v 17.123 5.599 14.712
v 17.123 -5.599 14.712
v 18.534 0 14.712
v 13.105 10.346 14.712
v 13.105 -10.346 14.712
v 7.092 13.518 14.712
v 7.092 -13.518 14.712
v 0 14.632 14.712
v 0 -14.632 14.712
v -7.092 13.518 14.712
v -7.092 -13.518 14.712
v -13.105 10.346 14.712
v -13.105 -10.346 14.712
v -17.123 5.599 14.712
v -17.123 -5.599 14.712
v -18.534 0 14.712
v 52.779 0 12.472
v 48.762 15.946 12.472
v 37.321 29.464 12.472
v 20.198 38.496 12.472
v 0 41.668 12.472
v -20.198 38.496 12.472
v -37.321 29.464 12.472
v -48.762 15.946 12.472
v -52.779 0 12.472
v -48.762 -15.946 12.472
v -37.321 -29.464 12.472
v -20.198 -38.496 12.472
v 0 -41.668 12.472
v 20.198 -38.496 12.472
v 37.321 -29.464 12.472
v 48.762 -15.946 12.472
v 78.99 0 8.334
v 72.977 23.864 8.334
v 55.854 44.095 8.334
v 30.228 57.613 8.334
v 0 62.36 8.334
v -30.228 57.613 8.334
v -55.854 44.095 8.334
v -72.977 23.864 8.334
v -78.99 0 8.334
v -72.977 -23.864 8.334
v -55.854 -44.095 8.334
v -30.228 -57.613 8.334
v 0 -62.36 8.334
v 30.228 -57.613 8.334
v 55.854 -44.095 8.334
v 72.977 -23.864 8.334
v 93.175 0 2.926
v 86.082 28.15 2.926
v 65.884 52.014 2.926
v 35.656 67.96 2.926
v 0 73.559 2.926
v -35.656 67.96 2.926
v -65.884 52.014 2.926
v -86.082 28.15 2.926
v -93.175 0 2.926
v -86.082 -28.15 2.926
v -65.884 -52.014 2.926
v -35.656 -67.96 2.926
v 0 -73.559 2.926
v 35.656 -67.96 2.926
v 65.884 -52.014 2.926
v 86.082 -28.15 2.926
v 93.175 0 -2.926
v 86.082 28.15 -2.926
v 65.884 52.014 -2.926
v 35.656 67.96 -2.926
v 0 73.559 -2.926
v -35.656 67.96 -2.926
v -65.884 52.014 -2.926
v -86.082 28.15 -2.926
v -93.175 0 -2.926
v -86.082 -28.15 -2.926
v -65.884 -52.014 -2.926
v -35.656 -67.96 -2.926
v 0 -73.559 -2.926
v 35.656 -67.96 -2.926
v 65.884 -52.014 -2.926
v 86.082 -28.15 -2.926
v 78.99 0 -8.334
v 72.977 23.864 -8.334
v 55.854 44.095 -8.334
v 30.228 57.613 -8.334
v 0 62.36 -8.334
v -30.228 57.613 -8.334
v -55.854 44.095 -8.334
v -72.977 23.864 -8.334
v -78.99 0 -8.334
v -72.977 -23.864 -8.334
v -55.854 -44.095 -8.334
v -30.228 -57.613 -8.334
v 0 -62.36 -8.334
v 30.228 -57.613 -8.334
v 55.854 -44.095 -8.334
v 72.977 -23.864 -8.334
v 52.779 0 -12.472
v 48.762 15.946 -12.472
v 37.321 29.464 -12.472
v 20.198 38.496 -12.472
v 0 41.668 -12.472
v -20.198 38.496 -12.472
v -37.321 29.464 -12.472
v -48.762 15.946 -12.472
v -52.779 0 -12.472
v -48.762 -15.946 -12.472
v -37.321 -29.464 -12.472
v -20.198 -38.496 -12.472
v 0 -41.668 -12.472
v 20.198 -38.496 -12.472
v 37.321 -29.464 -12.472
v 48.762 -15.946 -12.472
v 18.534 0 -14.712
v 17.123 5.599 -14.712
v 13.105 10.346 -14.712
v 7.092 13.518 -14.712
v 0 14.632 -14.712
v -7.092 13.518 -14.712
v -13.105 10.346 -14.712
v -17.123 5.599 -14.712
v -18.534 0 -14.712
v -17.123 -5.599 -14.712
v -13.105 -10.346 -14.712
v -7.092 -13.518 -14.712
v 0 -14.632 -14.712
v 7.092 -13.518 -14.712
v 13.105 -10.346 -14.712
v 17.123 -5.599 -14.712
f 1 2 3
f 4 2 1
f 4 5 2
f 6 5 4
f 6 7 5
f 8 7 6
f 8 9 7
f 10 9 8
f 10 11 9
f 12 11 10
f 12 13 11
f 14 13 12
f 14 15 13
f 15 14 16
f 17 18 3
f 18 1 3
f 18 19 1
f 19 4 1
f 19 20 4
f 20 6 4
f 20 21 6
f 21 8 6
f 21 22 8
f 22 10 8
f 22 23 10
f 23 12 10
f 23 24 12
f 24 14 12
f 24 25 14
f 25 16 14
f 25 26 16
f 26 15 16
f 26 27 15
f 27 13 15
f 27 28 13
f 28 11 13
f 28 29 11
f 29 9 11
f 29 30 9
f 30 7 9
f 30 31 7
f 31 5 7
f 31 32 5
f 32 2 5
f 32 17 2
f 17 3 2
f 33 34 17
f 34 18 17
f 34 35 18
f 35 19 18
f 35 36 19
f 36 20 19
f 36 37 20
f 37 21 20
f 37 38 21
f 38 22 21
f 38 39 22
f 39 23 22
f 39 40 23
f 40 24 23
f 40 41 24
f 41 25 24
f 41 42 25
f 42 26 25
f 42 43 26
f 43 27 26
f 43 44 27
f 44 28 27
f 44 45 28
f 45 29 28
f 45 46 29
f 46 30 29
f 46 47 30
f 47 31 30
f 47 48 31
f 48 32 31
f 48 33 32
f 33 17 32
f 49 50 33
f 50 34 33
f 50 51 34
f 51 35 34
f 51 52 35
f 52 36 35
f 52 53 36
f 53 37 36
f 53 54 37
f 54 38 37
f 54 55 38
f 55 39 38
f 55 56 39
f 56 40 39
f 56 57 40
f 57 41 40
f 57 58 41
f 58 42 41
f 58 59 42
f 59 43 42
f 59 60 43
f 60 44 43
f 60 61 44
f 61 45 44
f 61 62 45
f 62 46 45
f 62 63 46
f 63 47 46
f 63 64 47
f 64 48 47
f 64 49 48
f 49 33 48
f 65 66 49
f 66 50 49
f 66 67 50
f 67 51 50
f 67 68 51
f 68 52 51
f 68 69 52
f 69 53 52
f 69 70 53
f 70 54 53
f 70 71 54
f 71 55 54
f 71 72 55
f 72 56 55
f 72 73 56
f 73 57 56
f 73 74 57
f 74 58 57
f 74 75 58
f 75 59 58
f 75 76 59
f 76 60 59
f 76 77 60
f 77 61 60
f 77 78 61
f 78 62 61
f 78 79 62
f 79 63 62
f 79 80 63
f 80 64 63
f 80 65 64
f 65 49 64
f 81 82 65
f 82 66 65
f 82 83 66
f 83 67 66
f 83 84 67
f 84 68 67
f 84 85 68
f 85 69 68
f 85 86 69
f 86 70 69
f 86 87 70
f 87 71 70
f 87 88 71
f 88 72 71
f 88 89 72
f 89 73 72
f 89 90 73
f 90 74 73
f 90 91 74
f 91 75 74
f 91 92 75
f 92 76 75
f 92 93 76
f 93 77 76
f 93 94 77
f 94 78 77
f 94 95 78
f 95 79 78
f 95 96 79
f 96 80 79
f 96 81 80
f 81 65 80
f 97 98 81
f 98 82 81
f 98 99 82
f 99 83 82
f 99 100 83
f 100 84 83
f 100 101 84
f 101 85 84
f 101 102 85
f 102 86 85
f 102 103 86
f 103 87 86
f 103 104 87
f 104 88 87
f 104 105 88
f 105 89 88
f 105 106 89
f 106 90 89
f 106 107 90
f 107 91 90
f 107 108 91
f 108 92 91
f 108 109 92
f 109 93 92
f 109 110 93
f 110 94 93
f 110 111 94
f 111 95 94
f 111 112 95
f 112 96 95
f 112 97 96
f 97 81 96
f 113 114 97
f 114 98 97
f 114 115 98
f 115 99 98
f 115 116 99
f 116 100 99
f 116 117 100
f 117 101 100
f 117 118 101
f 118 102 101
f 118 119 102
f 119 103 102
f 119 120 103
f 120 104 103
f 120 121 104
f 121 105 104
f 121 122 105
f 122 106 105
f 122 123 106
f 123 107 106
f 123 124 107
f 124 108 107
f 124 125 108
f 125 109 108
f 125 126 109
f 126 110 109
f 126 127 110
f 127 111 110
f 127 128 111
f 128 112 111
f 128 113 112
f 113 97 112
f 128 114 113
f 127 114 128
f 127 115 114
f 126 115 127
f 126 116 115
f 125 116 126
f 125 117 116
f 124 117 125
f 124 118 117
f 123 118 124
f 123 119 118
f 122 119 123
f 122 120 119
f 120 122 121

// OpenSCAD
// Generated by SolidPython 1.0.1 on 2020-07-29 00:46:54


scale(v = [19, 15, 3]) {
	sphere(r = 5);
}
/***********************************************
*********      SolidPython code:      **********
************************************************
 
# import packages: SolidPython
from solid import *
from solid.utils import *
from itertools import chain, combinations, permutations


class Resize:

    def __init__(self, scad_file):
        self.scad_file = scad_file
        #self.scad_file = import_scad(scad_file)
        # cone/cylinder param:
        self.r1 = 0
        self.r2 = 0
        self.h = 0
        # rectangular prism param:
        self.w = 0
        self.l = 0
        # ellipse param:
        self.r = 0

    # import OpenScad code (file name corresponds to shape)


    # classify shape + parameters
    def assign(self, param1, param2, param3):
        if self.scad_file == 'cone.scad':
            self.r1 = param1
            self.r2 = param2
            self.h = param3
        elif self.scad_file == 'cylinder.scad':
            self.r1 = param1
            self.r2 = param2
            self.h = param3
        elif self.scad_file == 'rectangularPrism.scad':
            self.h = param1
            self.l = param2
            self.w = param3
        else:
            self.r = param1
            self.h = param2

    # resize parameters
    def iterate(self):
        x = range(3, 20, 2)
        i = 1
        if self.scad_file == 'cone.scad':
            tempList = list(permutations(x, 2))
            for temp in tempList:
                param1 = temp[0]
                param2 = temp[1]
                filepath = 'produced_scad_files/' + 'cone' + str(param1) + '_' + str(param2) + '_' + '.scad'
                scad_render_to_file(cylinder(h=param1, r1=param2, r2=0), filepath)

        elif self.scad_file == 'cylinder.scad':
            tempList = list(permutations(x, 3))
            for temp in tempList:
                param1 = temp[0]
                param2 = temp[1]
                filepath = 'produced_scad_files/' + 'cylinder' + str(param1) + '_' + str(param2) + '_' + '.scad'
                scad_render_to_file(cylinder(h=param1, r1=param2, r2=param2), filepath)

        elif self.scad_file == 'rectangularPrism.scad':
            tempList = list(permutations(x, 3))
            for temp in tempList:
                param1 = temp[0]
                param2 = temp[1]
                param3 = temp[2]
                filepath = 'produced_scad_files/' + 'rectangularPrism' + str(param1) + '_' + str(param2) + '_' + str(
                    param3) + '.scad'
                scad_render_to_file(cube(size=(param1, param2, param3)), filepath)

        elif self.scad_file == 'ellipse.scad':
            tempList = list(permutations(x, 4))
            for temp in tempList:
                param1 = temp[0]
                param2 = temp[1]
                param3 = temp[2]
                param4 = temp[3]
                filepath = 'produced_scad_files/' + 'ellipse' + str(param1) + '_' + str(param2) + '_' + str(param3) + '_' + str(param4) + '.scad'
                scad_render_to_file(scale([param1, param2, param3])(sphere(r=param4)), filepath)

    def render_to_scadfile(self):
        scad_render_to_file(scad, 'example.scad') 
 
************************************************/
